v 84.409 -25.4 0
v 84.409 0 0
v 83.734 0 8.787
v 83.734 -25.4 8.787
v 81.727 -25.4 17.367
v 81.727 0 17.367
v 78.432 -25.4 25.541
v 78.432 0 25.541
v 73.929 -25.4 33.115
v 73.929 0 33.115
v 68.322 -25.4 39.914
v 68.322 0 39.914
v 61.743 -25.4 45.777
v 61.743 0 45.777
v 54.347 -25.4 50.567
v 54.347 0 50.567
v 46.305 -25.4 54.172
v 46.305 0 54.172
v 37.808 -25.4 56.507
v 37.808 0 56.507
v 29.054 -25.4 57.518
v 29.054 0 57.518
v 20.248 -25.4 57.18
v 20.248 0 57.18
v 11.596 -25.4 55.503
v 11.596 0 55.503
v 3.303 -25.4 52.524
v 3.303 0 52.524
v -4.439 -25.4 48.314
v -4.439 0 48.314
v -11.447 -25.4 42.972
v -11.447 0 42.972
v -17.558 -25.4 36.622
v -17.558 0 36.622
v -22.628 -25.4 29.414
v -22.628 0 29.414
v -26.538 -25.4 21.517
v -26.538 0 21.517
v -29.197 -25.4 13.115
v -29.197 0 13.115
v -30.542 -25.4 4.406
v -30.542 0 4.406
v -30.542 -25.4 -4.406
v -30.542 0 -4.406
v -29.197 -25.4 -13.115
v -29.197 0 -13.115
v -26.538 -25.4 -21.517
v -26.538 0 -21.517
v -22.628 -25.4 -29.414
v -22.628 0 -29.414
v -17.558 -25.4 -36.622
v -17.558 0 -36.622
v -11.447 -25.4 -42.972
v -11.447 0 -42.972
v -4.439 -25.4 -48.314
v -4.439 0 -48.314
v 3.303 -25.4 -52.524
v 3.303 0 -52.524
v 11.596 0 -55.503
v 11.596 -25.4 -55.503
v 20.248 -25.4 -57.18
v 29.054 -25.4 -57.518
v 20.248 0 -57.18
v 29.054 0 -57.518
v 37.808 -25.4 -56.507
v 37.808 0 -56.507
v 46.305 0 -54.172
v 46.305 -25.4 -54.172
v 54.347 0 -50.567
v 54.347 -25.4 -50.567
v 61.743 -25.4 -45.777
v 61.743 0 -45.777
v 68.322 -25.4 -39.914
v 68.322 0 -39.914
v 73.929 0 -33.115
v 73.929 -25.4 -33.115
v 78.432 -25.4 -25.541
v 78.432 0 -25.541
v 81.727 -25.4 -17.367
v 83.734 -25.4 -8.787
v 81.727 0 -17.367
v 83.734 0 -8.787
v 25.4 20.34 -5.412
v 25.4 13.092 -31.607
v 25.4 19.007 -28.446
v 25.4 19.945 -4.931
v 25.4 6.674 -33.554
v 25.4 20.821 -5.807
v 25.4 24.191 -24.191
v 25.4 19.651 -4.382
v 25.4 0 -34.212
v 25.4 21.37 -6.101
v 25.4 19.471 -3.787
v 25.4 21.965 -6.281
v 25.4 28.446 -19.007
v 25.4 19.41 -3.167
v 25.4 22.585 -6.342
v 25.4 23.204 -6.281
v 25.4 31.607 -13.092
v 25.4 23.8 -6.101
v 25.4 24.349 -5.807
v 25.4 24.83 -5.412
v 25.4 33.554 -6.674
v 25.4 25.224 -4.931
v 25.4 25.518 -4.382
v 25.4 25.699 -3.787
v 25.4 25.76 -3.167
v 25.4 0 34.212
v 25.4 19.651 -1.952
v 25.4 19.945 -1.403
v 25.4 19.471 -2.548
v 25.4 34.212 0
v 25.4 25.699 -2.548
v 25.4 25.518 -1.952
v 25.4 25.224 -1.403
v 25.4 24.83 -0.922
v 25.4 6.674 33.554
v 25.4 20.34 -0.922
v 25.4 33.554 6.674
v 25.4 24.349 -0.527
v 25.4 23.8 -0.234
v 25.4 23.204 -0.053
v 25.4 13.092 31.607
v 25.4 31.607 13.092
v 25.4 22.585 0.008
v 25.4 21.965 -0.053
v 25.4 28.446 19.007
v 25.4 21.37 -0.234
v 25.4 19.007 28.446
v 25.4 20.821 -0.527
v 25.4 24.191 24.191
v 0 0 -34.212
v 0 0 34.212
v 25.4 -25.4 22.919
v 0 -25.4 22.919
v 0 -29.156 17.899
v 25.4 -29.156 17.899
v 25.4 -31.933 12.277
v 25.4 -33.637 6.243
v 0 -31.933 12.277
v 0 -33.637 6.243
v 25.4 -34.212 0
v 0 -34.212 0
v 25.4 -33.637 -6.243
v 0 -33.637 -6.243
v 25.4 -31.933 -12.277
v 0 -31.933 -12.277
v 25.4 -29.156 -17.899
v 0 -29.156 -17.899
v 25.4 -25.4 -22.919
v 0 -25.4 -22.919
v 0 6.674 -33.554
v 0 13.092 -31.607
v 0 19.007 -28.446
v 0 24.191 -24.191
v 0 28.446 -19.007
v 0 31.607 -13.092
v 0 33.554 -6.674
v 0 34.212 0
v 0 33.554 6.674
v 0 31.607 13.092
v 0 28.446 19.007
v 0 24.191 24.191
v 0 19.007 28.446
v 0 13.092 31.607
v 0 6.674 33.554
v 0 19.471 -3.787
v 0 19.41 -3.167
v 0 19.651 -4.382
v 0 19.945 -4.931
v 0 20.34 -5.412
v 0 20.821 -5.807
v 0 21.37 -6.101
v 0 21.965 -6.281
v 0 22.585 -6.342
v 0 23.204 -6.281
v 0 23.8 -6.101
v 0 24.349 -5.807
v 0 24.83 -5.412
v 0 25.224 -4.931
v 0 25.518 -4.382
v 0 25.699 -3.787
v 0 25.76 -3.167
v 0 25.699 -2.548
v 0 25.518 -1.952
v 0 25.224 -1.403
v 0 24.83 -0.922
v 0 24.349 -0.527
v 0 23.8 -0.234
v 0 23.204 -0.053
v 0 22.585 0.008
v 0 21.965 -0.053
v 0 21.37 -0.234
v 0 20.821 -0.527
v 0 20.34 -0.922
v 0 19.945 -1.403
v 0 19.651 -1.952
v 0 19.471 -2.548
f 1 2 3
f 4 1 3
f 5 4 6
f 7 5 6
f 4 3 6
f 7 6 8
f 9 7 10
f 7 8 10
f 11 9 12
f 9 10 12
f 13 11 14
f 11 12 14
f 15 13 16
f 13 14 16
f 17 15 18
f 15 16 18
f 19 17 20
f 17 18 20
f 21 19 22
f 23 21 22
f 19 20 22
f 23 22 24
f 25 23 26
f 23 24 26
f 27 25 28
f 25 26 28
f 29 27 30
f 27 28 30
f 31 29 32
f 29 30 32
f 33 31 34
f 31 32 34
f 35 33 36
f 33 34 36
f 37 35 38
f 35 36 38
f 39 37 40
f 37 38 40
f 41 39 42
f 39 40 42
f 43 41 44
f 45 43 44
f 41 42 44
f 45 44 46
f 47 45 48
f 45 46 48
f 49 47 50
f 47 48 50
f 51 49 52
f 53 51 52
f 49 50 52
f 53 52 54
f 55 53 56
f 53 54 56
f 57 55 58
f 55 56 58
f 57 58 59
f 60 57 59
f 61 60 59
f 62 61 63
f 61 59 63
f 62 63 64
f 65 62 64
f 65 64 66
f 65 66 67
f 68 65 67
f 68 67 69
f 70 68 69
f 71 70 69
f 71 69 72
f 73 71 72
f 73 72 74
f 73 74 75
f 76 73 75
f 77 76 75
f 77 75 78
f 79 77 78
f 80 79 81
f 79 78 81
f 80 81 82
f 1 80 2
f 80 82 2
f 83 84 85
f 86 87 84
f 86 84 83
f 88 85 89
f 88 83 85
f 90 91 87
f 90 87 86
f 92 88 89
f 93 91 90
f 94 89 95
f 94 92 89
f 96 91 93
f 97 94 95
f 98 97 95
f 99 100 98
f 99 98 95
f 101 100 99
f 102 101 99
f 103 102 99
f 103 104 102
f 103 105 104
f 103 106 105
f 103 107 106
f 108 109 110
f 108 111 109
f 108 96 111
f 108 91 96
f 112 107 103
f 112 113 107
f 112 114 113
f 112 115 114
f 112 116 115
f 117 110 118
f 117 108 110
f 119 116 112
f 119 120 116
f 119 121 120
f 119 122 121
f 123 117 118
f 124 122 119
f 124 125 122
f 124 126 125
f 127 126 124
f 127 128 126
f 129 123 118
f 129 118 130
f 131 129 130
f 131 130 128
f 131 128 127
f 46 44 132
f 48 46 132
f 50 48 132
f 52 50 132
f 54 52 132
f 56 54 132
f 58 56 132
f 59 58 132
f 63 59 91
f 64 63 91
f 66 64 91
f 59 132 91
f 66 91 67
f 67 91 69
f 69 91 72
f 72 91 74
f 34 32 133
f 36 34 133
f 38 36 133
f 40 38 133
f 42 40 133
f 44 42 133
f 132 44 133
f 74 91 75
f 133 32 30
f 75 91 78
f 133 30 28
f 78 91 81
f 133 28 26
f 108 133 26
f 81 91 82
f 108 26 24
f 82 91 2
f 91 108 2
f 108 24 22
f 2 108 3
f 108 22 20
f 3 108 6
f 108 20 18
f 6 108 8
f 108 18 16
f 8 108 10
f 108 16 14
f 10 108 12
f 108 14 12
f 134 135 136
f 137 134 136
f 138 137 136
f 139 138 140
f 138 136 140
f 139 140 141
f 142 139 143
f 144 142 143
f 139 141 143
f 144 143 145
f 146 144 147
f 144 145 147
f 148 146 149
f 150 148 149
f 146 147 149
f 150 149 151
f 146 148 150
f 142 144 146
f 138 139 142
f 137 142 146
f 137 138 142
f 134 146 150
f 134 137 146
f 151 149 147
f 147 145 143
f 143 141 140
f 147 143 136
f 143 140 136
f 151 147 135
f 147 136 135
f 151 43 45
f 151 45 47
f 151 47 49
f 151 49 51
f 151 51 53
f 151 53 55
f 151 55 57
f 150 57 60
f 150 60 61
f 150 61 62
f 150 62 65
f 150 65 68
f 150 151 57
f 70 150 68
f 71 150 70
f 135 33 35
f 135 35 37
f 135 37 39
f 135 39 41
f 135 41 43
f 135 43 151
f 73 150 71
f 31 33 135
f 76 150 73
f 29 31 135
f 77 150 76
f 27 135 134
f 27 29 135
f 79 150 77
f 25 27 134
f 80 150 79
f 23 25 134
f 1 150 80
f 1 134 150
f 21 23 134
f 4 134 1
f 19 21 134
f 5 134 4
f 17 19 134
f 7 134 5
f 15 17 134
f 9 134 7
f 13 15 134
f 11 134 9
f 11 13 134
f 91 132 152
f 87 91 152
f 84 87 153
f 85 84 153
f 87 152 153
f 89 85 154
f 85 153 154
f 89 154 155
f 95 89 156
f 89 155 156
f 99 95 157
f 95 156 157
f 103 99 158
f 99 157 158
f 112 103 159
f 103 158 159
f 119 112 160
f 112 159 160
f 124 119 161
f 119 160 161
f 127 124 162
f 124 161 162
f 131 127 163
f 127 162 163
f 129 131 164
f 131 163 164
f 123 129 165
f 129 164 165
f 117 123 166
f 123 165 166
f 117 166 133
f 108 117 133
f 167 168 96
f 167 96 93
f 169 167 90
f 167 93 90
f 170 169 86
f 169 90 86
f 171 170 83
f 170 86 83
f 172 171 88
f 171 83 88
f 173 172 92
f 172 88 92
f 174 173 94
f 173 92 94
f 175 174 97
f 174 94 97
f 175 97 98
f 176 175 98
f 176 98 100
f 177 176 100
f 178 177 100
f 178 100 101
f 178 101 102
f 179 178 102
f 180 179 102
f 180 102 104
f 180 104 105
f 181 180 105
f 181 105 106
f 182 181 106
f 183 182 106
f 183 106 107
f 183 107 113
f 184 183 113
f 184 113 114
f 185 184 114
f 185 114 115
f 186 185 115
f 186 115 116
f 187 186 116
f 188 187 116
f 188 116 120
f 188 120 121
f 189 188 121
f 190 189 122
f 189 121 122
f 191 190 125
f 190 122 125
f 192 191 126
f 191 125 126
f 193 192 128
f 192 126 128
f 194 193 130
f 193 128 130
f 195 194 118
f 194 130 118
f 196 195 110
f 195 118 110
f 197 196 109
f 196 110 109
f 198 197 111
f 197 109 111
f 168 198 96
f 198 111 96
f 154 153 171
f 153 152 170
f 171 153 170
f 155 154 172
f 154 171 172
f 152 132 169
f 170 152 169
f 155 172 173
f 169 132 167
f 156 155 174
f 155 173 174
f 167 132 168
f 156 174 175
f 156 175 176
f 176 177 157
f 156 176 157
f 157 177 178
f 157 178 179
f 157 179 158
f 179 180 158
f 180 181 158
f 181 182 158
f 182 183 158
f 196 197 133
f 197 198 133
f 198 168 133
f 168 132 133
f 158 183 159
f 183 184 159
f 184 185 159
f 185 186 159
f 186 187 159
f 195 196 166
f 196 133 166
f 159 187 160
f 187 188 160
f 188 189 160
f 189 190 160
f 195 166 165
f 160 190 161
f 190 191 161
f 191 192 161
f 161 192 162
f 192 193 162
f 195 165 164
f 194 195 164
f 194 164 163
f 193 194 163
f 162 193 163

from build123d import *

# Parameters (mm, degrees)
F0_R     = 34.2116613635
F1_DEPTH = 25.4
F2_R     = 57.5601591622
F3_DEPTH = 25.4
F5_D     = 6.35


with BuildPart() as f1:
    # F0 (on Right) → F1 (new body)
    with BuildSketch(Plane.YZ):
        Circle(F0_R)
    extrude(amount=F1_DEPTH)

    # F2 (on Front) → F3 (join)
    with BuildSketch(Plane.XZ):
        with Locations((26.8488749862, 0)):
            Circle(F2_R)
    extrude(amount=F3_DEPTH)

    # F5 (through all)
    with Locations(Plane(origin=(0, 0, 0), x_dir=(0, 1, 0), z_dir=(-1, 0, 0))):
        with Locations((22.584579885, 3.1673496123)):
            Hole(F5_D / 2)


solid = f1.part
